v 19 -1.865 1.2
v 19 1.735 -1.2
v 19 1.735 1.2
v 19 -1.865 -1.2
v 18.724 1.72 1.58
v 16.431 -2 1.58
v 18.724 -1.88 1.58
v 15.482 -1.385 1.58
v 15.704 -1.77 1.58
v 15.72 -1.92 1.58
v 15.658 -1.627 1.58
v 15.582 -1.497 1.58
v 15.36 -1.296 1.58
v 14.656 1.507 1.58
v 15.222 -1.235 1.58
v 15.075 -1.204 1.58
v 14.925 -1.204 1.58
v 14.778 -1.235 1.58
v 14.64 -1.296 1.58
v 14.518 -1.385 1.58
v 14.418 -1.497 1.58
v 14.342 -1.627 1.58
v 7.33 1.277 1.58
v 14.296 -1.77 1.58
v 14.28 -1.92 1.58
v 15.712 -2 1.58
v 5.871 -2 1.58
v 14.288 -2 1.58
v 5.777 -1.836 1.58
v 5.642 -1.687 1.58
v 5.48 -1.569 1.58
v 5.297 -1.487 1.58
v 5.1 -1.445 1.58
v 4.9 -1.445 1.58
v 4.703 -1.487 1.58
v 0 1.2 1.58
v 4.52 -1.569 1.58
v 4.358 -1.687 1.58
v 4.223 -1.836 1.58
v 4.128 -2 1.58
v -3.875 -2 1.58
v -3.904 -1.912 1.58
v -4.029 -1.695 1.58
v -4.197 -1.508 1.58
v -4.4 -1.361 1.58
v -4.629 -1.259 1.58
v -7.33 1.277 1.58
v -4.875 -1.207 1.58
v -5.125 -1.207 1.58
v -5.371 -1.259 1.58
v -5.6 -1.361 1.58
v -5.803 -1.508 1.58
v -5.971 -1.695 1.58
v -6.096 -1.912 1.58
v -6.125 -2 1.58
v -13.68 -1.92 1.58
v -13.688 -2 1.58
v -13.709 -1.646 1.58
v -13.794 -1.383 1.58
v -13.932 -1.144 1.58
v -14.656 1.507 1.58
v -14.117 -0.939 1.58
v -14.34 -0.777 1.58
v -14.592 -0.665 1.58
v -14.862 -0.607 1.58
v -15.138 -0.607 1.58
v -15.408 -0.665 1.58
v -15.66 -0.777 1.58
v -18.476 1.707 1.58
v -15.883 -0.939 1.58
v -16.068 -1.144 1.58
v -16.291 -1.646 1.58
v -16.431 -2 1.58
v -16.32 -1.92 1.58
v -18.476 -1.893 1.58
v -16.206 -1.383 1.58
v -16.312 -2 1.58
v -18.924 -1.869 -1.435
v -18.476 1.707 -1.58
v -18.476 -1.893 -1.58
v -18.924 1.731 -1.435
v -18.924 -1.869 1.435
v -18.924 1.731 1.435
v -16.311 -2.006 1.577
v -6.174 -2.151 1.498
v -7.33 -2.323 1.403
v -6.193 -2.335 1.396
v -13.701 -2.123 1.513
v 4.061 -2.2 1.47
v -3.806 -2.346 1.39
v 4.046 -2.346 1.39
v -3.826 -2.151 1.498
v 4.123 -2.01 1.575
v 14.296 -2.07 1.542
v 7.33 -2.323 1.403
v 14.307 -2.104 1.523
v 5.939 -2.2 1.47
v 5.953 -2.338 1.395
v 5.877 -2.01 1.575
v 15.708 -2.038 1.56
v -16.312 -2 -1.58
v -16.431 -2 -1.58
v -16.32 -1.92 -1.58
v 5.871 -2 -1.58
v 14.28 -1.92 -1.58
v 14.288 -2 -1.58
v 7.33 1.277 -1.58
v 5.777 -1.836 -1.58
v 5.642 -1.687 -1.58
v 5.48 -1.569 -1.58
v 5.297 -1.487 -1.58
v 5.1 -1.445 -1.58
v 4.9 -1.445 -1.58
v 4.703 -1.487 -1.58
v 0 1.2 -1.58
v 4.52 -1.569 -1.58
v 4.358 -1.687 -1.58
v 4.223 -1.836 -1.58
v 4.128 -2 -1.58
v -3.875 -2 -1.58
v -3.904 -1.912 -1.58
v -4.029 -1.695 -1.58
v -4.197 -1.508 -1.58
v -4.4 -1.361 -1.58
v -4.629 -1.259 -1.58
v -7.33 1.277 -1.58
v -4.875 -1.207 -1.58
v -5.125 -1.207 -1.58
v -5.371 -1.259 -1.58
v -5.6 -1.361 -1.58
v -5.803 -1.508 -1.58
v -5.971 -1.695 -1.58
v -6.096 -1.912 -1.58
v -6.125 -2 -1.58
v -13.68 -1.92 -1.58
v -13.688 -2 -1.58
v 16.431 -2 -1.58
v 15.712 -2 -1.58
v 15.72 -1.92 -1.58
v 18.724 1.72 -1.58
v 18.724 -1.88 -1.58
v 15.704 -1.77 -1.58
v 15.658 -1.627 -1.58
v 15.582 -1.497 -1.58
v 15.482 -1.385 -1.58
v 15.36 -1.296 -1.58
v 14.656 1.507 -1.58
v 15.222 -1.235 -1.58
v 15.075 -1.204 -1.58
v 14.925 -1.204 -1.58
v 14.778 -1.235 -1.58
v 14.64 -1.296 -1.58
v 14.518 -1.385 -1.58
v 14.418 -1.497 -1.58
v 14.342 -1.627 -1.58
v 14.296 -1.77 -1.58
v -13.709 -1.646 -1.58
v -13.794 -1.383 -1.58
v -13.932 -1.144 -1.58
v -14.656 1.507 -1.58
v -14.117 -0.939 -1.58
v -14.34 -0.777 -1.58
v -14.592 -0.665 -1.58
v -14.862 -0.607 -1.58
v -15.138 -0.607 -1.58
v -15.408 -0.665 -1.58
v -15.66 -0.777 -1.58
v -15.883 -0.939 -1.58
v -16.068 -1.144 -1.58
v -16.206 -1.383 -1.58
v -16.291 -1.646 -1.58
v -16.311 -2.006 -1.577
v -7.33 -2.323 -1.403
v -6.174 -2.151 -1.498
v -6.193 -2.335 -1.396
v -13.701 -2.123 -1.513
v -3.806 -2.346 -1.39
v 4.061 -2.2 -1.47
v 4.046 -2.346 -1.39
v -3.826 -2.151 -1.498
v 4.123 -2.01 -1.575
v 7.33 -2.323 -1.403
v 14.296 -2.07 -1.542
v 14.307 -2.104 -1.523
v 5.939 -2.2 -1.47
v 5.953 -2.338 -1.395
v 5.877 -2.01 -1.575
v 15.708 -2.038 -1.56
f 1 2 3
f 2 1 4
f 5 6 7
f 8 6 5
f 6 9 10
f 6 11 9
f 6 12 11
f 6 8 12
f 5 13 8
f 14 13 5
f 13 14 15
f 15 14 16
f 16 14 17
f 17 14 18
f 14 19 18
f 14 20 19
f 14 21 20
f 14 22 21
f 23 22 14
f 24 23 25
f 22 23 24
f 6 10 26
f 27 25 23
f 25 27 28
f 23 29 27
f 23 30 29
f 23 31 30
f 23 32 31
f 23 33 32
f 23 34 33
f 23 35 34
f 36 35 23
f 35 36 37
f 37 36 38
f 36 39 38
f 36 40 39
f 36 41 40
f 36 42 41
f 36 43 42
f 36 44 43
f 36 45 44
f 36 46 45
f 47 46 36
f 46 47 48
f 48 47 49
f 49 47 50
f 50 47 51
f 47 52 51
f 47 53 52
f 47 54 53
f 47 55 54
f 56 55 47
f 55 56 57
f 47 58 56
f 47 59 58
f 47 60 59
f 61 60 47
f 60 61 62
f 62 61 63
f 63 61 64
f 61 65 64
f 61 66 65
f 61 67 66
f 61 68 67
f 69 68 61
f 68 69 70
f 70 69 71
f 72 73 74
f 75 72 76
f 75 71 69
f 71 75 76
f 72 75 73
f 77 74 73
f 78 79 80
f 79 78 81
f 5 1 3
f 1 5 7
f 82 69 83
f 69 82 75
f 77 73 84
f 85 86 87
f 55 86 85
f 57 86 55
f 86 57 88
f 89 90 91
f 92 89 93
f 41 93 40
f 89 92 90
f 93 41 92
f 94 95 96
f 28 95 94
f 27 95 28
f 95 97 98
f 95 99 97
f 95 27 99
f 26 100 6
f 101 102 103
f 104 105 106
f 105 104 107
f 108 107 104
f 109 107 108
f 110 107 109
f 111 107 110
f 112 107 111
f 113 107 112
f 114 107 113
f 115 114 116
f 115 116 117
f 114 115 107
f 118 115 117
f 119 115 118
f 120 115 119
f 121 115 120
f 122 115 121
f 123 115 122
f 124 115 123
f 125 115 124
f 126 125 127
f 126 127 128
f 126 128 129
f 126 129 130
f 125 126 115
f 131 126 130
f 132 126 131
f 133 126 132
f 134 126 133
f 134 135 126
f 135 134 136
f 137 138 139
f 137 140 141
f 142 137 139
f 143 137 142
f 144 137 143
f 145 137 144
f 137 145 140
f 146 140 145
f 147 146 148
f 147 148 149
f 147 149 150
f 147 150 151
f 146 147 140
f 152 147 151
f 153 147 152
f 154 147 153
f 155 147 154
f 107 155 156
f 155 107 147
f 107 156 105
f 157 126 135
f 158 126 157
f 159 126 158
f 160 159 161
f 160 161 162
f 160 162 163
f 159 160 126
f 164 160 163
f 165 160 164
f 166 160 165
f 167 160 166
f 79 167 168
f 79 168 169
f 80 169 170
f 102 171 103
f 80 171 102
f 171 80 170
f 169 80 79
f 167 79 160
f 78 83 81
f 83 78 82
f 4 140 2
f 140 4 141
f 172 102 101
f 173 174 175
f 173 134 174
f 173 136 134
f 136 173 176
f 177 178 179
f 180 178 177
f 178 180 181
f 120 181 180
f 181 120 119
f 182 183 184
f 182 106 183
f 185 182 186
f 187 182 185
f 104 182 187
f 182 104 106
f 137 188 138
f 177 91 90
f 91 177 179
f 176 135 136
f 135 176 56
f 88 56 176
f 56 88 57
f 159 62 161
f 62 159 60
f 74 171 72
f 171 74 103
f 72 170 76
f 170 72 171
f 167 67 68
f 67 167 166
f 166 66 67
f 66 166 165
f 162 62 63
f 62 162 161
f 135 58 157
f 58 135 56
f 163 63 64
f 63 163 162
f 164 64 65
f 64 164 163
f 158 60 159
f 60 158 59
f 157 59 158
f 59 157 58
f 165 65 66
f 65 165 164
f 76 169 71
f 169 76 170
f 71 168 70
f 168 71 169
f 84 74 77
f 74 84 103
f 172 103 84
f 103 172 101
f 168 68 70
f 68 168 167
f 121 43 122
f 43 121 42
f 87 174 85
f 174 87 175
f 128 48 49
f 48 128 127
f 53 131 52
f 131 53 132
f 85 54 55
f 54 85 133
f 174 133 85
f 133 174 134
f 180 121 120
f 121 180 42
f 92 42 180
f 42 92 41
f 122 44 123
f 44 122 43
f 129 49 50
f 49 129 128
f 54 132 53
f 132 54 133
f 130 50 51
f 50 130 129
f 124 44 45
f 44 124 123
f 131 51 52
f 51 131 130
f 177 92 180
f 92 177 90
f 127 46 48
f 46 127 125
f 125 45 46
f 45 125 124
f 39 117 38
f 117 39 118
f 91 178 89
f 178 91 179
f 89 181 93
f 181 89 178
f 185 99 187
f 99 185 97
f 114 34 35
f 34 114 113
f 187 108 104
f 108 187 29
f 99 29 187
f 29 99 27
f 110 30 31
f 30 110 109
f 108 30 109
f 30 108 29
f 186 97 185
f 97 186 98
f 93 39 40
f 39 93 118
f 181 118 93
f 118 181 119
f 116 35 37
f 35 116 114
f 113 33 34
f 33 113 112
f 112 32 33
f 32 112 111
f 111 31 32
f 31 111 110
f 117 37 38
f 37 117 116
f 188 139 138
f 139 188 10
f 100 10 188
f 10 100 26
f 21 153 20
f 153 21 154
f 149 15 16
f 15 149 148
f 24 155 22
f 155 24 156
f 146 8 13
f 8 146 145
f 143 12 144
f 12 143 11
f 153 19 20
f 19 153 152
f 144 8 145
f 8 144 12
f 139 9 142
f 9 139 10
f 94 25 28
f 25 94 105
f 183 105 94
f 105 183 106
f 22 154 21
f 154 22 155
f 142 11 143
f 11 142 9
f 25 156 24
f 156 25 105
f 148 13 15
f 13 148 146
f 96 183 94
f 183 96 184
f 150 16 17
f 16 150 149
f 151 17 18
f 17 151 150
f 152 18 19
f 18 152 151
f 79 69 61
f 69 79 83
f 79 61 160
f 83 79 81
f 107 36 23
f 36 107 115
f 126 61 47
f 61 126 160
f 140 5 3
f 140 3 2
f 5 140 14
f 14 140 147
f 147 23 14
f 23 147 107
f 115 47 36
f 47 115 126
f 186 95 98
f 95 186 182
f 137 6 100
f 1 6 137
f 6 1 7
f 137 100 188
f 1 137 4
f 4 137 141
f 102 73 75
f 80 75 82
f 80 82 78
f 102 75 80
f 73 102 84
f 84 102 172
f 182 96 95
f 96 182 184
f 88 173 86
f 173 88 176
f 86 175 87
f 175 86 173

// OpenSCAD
// file: lib.scad
module hull_box(l,w,h,c, center=true)
{	
    translate([center ? 0 : l/2, center ? 0 : w/2, center ? 0 : h/2]) 
	hull() {
        translate([-l/2+c, -w/2+c, -h/2+c]) sphere(r=c);
        translate([ l/2-c, -w/2+c, -h/2+c]) sphere(r=c);
        translate([ l/2-c,  w/2-c, -h/2+c]) sphere(r=c);
        translate([-l/2+c,  w/2-c, -h/2+c]) sphere(r=c);
        translate([-l/2+c, -w/2+c,  h/2-c]) sphere(r=c);
        translate([ l/2-c, -w/2+c,  h/2-c]) sphere(r=c);
        translate([ l/2-c,  w/2-c,  h/2-c]) sphere(r=c);
        translate([-l/2+c,  w/2-c,  h/2-c]) sphere(r=c);
    }
}

module wedge(l,w,h1,h2) {
    hull() {
        translate([0,(l-h1)/2,0])
            rotate([0,90,0]) cylinder(d=h1, h=w, center=true);
        translate([0,-l*0.45,0])
            cube([w,l*0.1,h2], center=true);
    }
}

module hang(l1,l2,l3,w,t) {
    translate([0,l2/2-t/2,-l1/2]) rotate([90,0,0]) cube([w,l1,t], center=true);
    cube([w,l2,t], center=true);
    translate([0,-l2/2+t/2,-l3/2]) rotate([90,0,0]) cube([w,l3,t], center=true);
}

module hook(hd,hl,e,a=180,s=true) {
    cylinder(d=hd, h=hl, $fn=15);
    translate([0,-e,0])
	rotate([270,0,0]) rotate([0,90,0])
	    rotate_extrude(angle=a)
		translate([e, 0, 0]) 
		    circle(d=hd, $fn=15);
    if (s) {
	translate([0,0,hl])
	    sphere(d=hd);
	translate([0,-e*2,0])
	    sphere(d=hd);
    }
}

module rope_lock(l, h, di1, do1, di2, do2) {
	difference() {
		hull() {
			cylinder(d=do1, h=h);
			translate([l-(do1+do2)/2,0,0])
				cylinder(d=do2, h=h);
		}
	translate([0,0,-0.5])
		cylinder(d=di1, h=h+1);
	translate([l-(do1+do2)/2,0,-0.5])
		cylinder(d=di2, h=h+1);
	}
}

module rope_hook(l, h, di1, do1, di2, do2, a=30) {
	difference() {
		rope_lock(l, h, di1, do1, di2, do2);
		rotate([0,0,a]) translate([l/2,0,h/2])
			cube([l,di1/2,h+1], center=true);
	}
}

module hinge_unit(p,d,l,w,h) {
    difference() {
        intersection() {
            cube([l,w,h], center=true);
            union() {
                translate([p,0,0]) rotate([90,0,0]) cylinder(d=(l/2-p)*2,h=2*w, center=true);
                translate([-l/2,-w,-h/2]) cube([l/2+p,w*2,h]);
            }
        }
        translate([p,0,0]) rotate([90,0,0]) cylinder(d=d,h=2*w, center=true, $fn=15);
    }
}

module hinge_n(p,d,l,w,h,j=0.2, n=1, base_h=0) {
    translate([0,(l-base_h)/2,0])
        cube([(2*n-1)*(w+j),base_h,h], center=true);
	translate([-(n-1)*(w+j),0,0]) for (i = [0 : n-1] ) {
		translate([ 2*i*(w+j), 0, 0]) rotate([0,0,270]) hinge_unit(p,d,l,w,h);
	}
}

module hinge_join(p,d,l,w,h,j=0,base_h=0, n1=2, n2=3, ecart=0, angle=0, cutf=1.2)
{
    translate([0,-ecart,0]) rotate([-angle/2,0,0]) difference()
    {
      hinge_n(p,d,l,w,h,j,n1, base_h);
      translate([0,(ecart+l-p)/2,0]) rotate([0,90,0])
        cylinder(d=h*cutf, h=(n1+j)*2*w, center=true);
    }
    translate([0,ecart,0]) rotate([-angle/2,0,180])  difference()
    {
      hinge_n(p,d,l,w,h,j,n2, base_h);
      translate([0,(ecart+l-p)/2,0]) rotate([0,90,0])
        cylinder(d=h*cutf, h=(n2+j)*2*w, center=true);
    }
}

module hinge_lock(hd,hl,e,j=0.2, endlock=true) {
    cylinder(d=hd-j, h=hl, center=true, $fn=15);
    translate([-e,0,hl/2]) rotate([90,0,0]) rotate_extrude(angle=180, $fn=15)
       translate([e, 0, 0]) circle(d=hd-j);
    translate([-2*e,0,0]) rotate([0,0,0]) cylinder(d=hd-j, h=hl, center=true, $fn=15);
    translate([-e,0,-hl/2]) rotate([90,0,0]) rotate_extrude(angle=90, $fn=15)
       translate([-e, 0, 0]) circle(d=hd-j);
	if (endlock) {
		translate([-e/2,0,-hl/2-hd]) rotate([0,90,0]) cylinder(d=hd-j, h=hl/4, center=true, $fn=15);
	}
}

module grip(l, d, f=1.2, t=0.5, dg=0, dh=1, dfl=1, center=true) {
    difference() {
        hull() {
            cylinder(h=l, d=d*f, center=center);
            if (dg != 0) {
                translate([dg + (t>0 ? 1 : -1) * (center ? d/2 : 0), 0, 0])
#                    cylinder(h=l*dfl, d=dh, center=center);
            }
        }
        cylinder(h=l*1.1, d=d, center=center);
        translate([d*f*t, 0, 0])
            cube([d*f,d*f,l*1.1], center=center);
    }
}

module angle_hold(a,r,l,t,d, f=1.2, dt=0.67, fl=1, dg=0, dh=1, dfl=1) {
    difference() {
        rotate_extrude(angle=a)
            translate([r, 0, 0]) square([l,t], center=true);
        rotate([90,0,90-0.5])
            translate([0,0,r]) cylinder(h=l*f, d=d*f, center=true);
        rotate([90,0,90+a+0.5])
            translate([0,0,r]) cylinder(h=l*f, d=d*f, center=true);
    }
    rotate([90,0,90])
        translate([0,0,r*0.995]) grip(l=l*fl, d=d, f=f, t=-dt, dg=dg, dh=dh, dfl=dfl);
    rotate([90,0,90+a])
        translate([0,0,r*0.995]) grip(l=l*fl, d=d, f=f, t=dt, dg=-dg, dh=dh, dfl=dfl);
}

module tube_lock(hinge_p, hinge_d, hinge_l, hinge_w, hinge_h, grip_l, grip_d, n=1, flat=true, f_grip=1.2) {
    difference() {
        union() {
            grip(grip_l, grip_d, f_grip);
            translate([flat?-hinge_w/2:0,-(hinge_l+grip_d)/2,0]) 
                rotate([0, flat?0:90, 0])
                    hinge_n(hinge_p,hinge_d,hinge_l,hinge_w,hinge_h, n=n);
            translate([flat?-hinge_w/2:0,(hinge_l+grip_d)/2,0]) rotate([0,0,180])
                rotate([0, flat?0:90, 0])
                    hinge_n(hinge_p,hinge_d,hinge_l,hinge_w,hinge_h, n=n);
        }
        if(!flat) {
            translate([grip_d/2,0,0])
                cube([grip_d,grip_d*f_grip,grip_l], center=true);
        }
    }
}

module cylinder_groove_lock(d1,h1,d2,h2) {
    cylinder(d=d2,h=h2, $fn=30);
    translate([0,0,h2*0.95])
	cylinder(d=d1,h=h1, $fn=30);
}

module sphere_hold(d,e,j,d1,a1,d2,a2) {
    difference() {
        sphere(d=d+e);
        sphere(d=d+j);
        rotate([0,a1,0]) translate([d1,0,0])
#            cube([d+e+j,d+e+j,d+e+j], center=true);
        rotate([0,a2,0]) translate([d2,0,0])
#            cube([d+e+j,d+e+j,d+e+j], center=true);
    }
}

module sphere_magnet_hold(d,e,c,j,d1,a1,d2,a2) {
    difference() {
        sphere_hold(d,e,j,d1,a1,d2,a2);
        translate([-(d+c)/2,0,0])
#            cube([c+j,c+j,c+j], center=true);
    }
}

module sphere_hinge_hold(d,e,j,d1,a1,d2,a2,hp,hd,hl,hw,hh,hn=3,ah=0,av=0) {
	sphere_hold(d,e,j,d1,a1,d2,a2);
	rotate([0,ah,0]) 
		translate([-(d+hl)*0.49,0,0]) 
			rotate([0,av,-90])
				hinge_n(hp,hd,hl,hw,hh, n=hn, base_h=e*1.5);
}


module stepper_tool(d=6, h=10, j=0) {
	translate([0,0,-h]) difference() {
		cylinder(d=d, h=h, $fn=60);
		translate([0,0,h-9])
			intersection() {
				cylinder(d=5.5+j, h=10, $fn=15);
				translate([0, 0, (h+2)/2]) 
					cube([3+j, 10, 12], center=true);
			}
		translate([0, 0, h-3])
			rotate([90, 0, 90])
				cylinder(d=3, h=d*1.1, $fn=15, center=true);
	}
}

module stepper_tool_base(d=6, h=10, j=0, base_d=12, base_h=3) {
	stepper_tool(d, h, j);
	translate([0,0,base_h/2]) difference() {
		cylinder(d=base_d, h=base_h, center=true, $fn=60);
		cylinder(d=5.5+j, h=base_h+3, center=true, $fn=60);
		translate([0,0,1])
			cylinder(d=10+j, h=base_h-1, center=true, $fn=60);
	}
}

module wheel(d, h, n_hole, n_grip=0, groove_d=0) {
    difference() {
        union() {
            for(i = [0:n_grip]) {
                rotate([0, 0, i * 360 / n_grip])
                translate([d / 2, 0, 0])
        			cylinder(d=360/(3*n_grip), h=h, $fn=9, center=true);
            }
            cylinder(d=d, h=h, $fn=120, center=true);
        }
	    rotate_extrude(angle=360)
			translate([d/2, 0, 0]) 
#				circle(d=groove_d, $fn=4);
        for(i = [0:n_hole]) {
            rotate([0, 0, i*360/n_hole]) hull() {
                translate([d/6, 0, 0])
                cylinder(d=d/(n_hole+1), h=h*1.1, $fn=30, center=true);
                translate([d/2.2 - d/(n_hole+1), 0, 0])
                cylinder(d=d*2/(n_hole+1), h=h*1.1, $fn=30, center=true);
            }
        }
    }
}
// main file
include <lib.scad>

E=2.2;
A=2;
D=1.6;
G=1.2;

delta=10;
f_jeu=1.2;

l=38;
w=3.2;
h=4.8;

r_curve=350;
f_curve=0.8;

rotate([90,0,0]) intersection() {
difference() {
	hull_box(l, w, h, 0.4, center=true);
	translate([-delta*3/2,0,h/2*f_curve])
		rotate([90,0,0])
#		cylinder(d=E*f_jeu, h=w*2, center=true, $fn=30);
	translate([-delta*1/2,0,h/2])
		rotate([90,0,0])
#		cylinder(d=A*f_jeu, h=w*2, center=true, $fn=30);
	translate([ delta*1/2,0,h/2])
		rotate([90,0,0])
#		cylinder(d=D*f_jeu, h=w*2, center=true, $fn=30);
	translate([ delta*3/2,0,h/2*f_curve])
		rotate([90,0,0])
#		cylinder(d=G*f_jeu, h=w*2, center=true, $fn=30);
	translate([0,0,-(r_curve+h/4)])
		rotate([90,0,0])
		cylinder(r=r_curve, h=w*2, center=true, $fn=300);	
}
	translate([0,0,-(r_curve-h/2)])
		rotate([90,0,0])
		cylinder(r=r_curve, h=w*2, center=true, $fn=300);	
}
